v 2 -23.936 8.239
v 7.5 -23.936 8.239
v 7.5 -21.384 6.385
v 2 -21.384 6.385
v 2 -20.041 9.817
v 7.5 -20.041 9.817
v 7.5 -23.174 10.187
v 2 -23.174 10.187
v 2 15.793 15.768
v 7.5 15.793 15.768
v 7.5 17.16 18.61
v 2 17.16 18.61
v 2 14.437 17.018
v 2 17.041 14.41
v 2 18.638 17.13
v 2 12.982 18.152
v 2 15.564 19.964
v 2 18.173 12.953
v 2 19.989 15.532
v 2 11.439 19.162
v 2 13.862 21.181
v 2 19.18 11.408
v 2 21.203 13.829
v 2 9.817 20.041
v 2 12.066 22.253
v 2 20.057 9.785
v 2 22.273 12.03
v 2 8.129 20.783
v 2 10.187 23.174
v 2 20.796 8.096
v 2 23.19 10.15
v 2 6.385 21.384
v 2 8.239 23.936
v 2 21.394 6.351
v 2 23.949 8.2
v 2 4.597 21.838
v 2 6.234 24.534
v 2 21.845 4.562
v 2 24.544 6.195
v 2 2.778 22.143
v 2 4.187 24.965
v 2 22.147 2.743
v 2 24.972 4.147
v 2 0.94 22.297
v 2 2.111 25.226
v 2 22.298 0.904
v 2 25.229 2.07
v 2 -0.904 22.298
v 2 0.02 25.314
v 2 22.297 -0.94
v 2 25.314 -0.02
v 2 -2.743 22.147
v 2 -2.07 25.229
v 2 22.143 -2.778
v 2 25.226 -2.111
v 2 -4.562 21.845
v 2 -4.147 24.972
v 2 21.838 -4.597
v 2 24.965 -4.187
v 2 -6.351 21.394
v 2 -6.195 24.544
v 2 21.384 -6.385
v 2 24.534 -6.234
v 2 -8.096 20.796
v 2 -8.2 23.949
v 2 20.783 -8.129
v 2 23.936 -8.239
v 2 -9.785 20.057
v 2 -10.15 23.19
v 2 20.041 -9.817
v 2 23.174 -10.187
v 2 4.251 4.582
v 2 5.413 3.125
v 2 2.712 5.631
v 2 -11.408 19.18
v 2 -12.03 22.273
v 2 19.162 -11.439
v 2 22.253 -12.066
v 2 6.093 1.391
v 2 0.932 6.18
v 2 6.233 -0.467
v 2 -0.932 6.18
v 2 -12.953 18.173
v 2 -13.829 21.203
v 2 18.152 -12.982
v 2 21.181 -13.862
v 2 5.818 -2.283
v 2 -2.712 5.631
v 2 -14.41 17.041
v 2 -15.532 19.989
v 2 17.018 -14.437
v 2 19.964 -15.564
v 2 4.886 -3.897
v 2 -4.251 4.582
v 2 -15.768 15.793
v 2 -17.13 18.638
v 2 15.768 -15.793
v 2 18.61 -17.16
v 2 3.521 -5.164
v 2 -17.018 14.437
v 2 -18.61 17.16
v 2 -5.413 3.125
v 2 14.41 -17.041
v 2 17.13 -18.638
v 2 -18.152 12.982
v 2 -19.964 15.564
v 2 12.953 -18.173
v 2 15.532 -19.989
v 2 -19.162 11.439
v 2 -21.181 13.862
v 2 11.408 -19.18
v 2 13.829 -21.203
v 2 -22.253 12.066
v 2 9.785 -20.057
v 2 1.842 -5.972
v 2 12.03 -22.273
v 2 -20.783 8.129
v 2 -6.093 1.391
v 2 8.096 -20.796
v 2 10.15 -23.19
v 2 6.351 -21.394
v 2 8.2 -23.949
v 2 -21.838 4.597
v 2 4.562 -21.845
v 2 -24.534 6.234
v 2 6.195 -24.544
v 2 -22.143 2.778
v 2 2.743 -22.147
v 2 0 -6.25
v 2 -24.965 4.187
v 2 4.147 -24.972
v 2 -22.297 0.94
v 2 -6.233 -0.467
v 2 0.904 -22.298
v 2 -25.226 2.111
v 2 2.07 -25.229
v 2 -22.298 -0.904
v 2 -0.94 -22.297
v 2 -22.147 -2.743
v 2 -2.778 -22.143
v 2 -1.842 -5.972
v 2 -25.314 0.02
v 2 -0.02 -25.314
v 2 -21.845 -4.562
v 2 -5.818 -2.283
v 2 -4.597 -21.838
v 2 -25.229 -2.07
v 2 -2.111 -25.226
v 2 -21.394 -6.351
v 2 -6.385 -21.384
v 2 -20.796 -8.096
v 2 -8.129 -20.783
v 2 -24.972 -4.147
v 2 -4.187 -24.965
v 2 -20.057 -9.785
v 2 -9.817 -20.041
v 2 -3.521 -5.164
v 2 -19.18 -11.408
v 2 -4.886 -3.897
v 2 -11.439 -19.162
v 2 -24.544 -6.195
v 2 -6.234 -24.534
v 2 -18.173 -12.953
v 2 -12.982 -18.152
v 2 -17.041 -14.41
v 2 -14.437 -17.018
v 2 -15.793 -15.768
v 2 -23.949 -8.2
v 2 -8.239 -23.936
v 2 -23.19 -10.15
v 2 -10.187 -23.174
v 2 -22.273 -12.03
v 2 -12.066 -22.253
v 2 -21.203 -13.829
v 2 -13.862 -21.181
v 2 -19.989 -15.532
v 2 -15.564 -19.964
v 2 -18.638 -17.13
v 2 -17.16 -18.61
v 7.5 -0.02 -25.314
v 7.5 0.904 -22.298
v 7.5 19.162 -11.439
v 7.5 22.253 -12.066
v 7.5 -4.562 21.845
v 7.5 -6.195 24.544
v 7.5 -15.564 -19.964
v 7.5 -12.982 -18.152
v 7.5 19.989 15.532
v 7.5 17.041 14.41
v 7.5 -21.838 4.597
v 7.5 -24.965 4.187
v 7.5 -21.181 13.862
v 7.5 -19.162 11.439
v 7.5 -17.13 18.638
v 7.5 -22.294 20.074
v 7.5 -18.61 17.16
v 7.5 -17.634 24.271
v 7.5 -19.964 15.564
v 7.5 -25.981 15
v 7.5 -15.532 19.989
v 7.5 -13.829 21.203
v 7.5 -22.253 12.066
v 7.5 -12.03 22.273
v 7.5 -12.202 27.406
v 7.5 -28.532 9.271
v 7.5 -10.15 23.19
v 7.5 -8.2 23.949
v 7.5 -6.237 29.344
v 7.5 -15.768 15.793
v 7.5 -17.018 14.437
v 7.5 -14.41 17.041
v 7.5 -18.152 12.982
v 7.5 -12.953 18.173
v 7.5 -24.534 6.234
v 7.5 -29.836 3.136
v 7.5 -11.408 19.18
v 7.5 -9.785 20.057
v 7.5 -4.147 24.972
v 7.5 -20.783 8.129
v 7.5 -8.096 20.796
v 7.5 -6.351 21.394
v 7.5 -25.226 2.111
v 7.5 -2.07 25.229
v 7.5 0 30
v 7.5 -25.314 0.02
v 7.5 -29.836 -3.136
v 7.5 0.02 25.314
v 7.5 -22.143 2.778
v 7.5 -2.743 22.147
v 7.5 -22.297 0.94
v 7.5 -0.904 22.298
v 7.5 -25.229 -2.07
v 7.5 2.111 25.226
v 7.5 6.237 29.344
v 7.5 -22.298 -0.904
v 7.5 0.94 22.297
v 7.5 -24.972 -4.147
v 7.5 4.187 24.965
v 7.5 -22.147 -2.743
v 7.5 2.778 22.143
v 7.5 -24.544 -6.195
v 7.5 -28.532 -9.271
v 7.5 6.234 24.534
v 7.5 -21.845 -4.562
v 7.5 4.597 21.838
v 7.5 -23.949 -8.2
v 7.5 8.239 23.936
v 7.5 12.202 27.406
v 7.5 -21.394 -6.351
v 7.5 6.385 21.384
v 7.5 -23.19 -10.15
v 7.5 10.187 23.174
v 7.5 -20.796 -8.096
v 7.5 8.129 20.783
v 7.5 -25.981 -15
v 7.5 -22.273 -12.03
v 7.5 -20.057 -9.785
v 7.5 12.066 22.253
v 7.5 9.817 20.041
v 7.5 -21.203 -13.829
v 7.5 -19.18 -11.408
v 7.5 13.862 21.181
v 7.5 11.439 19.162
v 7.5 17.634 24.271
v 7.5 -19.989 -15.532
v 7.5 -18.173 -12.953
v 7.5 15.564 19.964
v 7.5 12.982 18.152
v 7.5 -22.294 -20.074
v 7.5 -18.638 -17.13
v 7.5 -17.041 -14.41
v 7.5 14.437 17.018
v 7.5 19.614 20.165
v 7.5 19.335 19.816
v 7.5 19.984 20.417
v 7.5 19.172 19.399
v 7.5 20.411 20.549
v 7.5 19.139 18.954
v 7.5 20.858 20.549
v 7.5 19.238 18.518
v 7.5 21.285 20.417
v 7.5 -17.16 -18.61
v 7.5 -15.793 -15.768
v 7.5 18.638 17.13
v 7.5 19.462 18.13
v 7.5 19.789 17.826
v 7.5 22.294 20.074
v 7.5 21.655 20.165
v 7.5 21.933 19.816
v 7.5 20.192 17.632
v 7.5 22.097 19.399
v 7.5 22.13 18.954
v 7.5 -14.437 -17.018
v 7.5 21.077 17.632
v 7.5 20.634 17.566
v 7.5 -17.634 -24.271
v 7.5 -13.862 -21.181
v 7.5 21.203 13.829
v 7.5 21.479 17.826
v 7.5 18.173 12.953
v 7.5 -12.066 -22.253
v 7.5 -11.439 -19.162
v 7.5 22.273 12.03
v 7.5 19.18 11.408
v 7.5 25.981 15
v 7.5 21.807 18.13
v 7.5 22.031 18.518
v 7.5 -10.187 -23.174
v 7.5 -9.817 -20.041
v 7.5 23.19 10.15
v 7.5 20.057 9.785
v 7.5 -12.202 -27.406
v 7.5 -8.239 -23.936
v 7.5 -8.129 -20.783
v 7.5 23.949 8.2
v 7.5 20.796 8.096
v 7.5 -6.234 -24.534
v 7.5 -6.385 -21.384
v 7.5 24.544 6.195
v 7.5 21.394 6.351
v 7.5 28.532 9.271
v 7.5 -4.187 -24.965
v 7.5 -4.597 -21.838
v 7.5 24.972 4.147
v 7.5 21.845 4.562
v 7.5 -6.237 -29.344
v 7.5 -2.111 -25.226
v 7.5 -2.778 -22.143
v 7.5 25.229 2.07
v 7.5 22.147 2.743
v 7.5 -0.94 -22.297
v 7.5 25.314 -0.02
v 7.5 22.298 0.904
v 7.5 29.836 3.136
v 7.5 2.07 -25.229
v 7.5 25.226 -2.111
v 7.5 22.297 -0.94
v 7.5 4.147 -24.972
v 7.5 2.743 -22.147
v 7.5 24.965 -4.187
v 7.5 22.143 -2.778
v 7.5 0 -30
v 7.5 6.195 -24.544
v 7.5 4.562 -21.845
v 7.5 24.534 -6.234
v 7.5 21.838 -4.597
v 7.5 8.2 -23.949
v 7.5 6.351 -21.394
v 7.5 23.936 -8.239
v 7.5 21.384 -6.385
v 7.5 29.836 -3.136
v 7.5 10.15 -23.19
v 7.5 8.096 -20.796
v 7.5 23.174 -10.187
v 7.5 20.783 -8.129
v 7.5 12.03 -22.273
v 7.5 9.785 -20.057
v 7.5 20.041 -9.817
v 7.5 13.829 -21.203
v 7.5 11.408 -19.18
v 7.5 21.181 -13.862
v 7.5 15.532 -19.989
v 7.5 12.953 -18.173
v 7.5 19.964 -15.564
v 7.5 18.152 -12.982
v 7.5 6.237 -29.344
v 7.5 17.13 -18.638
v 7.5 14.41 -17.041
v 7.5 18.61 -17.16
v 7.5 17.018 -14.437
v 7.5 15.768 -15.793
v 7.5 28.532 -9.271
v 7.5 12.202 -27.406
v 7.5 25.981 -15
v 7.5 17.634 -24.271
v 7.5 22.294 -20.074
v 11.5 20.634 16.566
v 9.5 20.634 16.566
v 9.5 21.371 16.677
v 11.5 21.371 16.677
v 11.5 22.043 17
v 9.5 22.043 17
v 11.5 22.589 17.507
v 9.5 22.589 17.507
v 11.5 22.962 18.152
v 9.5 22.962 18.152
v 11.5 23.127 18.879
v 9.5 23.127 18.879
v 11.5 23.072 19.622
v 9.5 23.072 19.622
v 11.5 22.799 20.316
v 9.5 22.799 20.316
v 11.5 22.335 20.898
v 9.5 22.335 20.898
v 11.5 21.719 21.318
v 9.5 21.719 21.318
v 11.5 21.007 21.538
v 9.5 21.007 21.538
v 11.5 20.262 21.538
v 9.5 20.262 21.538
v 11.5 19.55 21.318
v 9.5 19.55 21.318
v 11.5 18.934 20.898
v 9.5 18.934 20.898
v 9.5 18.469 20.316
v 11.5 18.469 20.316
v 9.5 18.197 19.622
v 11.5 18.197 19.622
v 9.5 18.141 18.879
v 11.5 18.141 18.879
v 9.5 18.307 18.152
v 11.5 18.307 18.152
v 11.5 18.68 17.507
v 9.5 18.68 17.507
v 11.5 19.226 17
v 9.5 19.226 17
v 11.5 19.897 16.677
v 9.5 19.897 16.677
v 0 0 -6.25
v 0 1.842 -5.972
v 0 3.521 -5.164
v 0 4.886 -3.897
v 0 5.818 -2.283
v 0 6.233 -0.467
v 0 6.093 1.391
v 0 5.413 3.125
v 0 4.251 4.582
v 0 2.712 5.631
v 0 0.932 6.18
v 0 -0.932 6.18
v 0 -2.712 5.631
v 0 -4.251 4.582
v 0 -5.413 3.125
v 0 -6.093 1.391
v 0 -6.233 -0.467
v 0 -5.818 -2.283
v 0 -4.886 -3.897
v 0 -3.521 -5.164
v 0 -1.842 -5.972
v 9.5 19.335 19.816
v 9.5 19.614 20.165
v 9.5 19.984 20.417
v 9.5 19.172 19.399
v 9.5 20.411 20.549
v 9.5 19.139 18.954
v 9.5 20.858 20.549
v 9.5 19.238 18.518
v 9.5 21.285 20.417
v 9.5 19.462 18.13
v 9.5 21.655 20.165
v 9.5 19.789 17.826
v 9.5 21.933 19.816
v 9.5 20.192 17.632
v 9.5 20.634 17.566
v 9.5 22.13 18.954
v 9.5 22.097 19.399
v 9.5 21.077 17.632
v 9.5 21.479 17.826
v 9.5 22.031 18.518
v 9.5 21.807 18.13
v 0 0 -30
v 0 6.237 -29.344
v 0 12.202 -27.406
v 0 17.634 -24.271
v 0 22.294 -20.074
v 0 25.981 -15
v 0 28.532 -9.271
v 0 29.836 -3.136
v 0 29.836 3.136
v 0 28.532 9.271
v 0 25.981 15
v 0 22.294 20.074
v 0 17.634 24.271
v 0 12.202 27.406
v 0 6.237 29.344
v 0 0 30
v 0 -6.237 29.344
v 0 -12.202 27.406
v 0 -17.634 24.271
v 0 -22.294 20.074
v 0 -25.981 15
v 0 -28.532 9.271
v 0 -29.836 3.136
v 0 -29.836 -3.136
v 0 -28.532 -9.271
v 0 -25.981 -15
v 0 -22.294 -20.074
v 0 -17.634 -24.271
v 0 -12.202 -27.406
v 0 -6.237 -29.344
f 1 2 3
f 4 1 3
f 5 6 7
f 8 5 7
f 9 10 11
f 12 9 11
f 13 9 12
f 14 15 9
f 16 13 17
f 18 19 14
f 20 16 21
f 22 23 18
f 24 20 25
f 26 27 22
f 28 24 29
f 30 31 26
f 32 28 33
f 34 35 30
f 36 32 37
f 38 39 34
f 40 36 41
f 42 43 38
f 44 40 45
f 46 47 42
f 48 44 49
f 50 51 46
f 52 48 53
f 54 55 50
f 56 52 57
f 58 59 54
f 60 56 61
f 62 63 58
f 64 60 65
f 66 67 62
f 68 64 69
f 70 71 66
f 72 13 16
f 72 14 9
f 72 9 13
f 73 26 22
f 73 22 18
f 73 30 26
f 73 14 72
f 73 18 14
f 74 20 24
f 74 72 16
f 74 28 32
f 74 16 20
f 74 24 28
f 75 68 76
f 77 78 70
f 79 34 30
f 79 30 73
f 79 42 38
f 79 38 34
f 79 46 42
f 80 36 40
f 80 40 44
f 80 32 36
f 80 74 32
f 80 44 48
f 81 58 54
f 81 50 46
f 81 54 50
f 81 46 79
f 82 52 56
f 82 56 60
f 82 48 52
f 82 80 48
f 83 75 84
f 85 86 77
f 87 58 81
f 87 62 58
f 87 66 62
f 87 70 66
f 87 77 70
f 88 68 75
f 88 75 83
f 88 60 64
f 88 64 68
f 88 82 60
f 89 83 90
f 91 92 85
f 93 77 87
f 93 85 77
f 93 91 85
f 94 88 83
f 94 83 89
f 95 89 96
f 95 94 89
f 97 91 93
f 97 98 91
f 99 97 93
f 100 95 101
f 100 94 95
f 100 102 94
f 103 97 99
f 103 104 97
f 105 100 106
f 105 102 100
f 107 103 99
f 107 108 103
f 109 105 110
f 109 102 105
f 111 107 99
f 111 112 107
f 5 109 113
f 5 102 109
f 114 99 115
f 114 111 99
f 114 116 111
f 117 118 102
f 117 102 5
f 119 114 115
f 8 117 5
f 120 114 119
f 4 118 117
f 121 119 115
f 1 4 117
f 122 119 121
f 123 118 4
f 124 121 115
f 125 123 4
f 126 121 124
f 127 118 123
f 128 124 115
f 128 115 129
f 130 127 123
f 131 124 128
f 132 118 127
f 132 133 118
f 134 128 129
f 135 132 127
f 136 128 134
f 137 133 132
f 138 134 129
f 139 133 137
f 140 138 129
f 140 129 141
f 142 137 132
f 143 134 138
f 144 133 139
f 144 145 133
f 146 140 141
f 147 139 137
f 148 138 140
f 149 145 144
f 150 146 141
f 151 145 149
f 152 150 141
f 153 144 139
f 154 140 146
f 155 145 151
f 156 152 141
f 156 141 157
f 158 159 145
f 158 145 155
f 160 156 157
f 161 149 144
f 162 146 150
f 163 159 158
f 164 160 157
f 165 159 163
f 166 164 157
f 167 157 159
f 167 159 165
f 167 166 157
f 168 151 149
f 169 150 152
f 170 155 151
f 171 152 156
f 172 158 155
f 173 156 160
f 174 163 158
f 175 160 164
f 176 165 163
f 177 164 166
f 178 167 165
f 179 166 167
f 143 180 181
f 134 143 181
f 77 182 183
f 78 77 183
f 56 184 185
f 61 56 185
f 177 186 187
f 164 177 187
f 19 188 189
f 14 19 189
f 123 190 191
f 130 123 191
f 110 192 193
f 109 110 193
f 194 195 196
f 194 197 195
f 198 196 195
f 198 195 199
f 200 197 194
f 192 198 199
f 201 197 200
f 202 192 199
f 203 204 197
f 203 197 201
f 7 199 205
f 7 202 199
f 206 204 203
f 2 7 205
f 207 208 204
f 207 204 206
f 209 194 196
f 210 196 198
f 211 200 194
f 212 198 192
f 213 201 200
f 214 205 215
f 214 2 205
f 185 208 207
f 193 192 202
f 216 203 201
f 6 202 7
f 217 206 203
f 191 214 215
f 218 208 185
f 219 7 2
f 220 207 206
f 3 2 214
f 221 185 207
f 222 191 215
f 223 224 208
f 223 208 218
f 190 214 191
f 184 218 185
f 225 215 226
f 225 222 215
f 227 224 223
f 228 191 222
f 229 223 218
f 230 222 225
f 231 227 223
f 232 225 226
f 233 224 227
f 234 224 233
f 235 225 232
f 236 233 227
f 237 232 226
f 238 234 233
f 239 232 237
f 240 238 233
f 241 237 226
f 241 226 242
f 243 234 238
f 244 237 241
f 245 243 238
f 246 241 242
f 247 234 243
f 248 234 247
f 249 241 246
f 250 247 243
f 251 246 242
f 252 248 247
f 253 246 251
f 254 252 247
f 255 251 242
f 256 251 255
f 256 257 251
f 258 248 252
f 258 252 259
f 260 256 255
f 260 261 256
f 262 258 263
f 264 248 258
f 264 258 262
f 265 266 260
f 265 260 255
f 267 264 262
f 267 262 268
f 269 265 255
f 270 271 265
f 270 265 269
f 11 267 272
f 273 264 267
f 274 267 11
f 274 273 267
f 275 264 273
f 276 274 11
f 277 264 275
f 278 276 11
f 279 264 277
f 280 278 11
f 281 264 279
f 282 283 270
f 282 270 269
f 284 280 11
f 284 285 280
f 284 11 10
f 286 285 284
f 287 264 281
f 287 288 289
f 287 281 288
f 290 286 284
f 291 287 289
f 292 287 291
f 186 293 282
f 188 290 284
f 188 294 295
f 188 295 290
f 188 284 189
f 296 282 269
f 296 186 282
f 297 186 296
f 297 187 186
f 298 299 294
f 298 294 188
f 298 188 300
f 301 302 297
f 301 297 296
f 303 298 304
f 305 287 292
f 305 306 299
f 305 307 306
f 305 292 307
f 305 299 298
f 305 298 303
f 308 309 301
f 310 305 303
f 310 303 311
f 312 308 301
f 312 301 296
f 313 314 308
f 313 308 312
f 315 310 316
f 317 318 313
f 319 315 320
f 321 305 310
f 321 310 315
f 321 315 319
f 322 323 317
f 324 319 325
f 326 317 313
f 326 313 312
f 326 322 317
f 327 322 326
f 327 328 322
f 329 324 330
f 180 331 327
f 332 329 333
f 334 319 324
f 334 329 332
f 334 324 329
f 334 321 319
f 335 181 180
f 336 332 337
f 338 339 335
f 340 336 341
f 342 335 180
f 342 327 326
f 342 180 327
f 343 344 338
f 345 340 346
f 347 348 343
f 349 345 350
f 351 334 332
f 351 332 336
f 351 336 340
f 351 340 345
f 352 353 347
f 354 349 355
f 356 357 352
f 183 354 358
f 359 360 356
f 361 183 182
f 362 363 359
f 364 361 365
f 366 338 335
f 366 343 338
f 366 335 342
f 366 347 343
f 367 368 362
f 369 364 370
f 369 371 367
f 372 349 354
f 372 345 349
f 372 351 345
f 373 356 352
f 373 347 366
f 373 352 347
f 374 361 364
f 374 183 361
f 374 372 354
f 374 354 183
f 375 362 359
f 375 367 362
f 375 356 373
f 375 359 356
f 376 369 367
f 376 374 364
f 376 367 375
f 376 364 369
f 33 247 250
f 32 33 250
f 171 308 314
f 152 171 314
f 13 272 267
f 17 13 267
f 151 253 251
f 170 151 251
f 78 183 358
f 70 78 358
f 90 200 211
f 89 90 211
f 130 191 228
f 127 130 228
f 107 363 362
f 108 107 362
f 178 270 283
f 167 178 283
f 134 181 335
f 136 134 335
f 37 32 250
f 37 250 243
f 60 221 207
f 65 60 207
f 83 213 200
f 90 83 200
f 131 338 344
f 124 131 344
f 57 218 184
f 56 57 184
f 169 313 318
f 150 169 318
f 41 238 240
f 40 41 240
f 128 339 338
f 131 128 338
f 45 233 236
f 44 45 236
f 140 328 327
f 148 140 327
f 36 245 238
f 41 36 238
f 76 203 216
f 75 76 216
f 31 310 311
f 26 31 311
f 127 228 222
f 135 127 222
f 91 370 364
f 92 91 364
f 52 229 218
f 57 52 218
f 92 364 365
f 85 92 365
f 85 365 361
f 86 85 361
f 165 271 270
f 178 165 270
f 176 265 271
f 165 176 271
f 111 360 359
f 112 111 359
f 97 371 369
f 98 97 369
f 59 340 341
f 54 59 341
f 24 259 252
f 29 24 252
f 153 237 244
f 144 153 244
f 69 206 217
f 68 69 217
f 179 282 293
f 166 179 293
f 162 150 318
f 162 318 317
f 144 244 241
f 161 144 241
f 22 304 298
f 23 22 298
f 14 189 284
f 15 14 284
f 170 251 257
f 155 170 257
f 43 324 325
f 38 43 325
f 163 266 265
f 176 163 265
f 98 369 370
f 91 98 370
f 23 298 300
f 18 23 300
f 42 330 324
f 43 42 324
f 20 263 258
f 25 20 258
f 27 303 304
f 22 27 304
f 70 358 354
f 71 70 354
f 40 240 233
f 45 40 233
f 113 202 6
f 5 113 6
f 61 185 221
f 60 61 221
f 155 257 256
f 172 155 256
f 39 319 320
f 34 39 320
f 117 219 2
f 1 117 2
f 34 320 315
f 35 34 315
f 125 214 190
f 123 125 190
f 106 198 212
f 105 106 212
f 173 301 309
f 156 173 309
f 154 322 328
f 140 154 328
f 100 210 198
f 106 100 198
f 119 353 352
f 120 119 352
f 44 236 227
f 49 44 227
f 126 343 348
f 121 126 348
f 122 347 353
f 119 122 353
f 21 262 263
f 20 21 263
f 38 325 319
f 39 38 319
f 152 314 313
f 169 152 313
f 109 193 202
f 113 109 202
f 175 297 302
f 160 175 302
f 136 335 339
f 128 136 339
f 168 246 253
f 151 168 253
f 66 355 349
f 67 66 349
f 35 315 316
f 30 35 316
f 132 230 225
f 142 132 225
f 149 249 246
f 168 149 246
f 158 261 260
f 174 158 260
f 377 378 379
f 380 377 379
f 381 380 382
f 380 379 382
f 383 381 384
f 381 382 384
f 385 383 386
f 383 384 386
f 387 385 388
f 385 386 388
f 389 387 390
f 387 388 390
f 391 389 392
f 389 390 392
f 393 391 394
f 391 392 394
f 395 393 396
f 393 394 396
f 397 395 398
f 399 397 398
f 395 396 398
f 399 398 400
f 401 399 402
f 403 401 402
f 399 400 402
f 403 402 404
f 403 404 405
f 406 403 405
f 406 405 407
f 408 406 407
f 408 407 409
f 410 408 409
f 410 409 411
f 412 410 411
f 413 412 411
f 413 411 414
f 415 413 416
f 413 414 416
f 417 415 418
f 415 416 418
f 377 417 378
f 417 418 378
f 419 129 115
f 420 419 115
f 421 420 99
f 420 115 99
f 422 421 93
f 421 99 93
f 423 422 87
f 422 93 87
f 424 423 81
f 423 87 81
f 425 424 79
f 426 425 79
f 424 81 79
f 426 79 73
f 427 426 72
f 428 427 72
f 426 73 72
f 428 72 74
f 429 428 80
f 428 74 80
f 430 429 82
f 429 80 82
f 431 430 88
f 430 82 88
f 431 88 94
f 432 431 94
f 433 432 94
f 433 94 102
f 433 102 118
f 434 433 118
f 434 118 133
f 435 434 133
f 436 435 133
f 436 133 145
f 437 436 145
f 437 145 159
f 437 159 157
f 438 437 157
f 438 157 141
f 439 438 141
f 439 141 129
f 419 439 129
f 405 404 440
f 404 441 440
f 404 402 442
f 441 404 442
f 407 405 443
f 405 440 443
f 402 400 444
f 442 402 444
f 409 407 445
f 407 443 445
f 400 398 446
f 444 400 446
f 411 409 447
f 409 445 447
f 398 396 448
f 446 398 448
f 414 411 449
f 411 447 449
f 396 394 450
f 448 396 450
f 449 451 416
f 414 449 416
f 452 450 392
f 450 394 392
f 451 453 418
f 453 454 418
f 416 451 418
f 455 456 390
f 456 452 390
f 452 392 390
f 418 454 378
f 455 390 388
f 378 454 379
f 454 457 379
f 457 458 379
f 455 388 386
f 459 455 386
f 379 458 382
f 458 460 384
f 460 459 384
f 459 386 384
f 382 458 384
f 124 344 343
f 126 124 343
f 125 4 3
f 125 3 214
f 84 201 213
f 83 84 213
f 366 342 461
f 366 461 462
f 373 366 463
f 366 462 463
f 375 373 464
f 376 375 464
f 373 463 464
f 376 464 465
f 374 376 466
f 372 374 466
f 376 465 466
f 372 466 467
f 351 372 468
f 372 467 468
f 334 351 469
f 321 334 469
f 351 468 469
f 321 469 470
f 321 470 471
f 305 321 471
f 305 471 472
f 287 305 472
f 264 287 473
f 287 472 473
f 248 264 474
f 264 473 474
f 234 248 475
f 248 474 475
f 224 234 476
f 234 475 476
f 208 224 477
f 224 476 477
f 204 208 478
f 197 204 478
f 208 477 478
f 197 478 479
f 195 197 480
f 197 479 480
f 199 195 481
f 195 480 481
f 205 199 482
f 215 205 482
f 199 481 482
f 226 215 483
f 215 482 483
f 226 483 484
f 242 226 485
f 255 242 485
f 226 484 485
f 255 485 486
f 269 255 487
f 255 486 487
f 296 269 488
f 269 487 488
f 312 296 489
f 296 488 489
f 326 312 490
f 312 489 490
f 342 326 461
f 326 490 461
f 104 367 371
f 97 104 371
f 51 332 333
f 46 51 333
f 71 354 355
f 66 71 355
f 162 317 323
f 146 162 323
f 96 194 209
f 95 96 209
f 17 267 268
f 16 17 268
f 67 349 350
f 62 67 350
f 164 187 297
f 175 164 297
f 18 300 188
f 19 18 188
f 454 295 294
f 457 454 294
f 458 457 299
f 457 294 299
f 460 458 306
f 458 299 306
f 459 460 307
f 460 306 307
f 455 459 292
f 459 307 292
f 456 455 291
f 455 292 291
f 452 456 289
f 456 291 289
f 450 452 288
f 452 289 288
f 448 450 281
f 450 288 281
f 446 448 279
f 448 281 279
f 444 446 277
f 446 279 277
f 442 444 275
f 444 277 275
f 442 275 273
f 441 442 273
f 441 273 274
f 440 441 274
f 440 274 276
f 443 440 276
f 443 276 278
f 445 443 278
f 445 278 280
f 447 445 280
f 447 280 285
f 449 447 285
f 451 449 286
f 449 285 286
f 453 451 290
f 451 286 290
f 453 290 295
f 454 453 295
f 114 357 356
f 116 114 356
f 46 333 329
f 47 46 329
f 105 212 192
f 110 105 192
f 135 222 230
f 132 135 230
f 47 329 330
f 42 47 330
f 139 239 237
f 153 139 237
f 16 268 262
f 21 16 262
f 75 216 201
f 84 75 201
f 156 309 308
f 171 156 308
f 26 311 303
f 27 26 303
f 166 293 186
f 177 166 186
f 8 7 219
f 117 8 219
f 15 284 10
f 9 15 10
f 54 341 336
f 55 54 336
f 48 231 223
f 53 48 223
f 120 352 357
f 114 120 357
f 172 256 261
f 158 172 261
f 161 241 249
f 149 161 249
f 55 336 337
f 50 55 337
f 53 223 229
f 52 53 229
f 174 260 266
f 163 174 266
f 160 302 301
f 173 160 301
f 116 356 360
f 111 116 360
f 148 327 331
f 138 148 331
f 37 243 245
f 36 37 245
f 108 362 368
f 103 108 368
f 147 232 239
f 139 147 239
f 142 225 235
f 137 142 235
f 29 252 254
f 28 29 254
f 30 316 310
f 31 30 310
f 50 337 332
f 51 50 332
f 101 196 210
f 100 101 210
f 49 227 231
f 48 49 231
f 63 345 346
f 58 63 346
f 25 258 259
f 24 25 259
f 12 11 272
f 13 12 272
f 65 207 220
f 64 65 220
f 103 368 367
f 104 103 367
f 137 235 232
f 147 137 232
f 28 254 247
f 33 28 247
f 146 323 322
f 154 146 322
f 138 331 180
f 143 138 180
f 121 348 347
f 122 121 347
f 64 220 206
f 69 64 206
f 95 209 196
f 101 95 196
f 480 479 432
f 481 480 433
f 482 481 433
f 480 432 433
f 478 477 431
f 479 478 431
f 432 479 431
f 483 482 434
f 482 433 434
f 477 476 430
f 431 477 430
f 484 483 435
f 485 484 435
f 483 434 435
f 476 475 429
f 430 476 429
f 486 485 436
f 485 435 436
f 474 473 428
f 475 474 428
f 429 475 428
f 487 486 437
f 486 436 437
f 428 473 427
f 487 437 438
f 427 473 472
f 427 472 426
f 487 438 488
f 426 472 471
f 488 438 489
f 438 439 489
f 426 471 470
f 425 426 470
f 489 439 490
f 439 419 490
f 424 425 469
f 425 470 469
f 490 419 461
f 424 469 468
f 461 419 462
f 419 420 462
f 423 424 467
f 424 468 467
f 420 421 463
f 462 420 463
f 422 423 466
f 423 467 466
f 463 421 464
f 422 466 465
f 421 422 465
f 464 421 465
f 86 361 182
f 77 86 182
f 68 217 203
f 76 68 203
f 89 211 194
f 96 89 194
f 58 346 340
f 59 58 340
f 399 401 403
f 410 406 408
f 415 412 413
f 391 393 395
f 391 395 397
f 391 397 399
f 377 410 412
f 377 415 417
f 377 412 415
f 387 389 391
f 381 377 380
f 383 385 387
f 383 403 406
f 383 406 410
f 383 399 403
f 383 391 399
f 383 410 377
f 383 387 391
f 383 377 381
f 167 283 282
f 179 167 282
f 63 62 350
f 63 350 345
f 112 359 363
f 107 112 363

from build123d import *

# Parameters (mm, degrees)
SKETCH1_R           = 30
BOSS_EXTRUDE1_DEPTH = 7.5
CUT_EXTRUDE2_DEPTH  = 5.5
SKETCH6_R           = 6.25
CUT_EXTRUDE3_DEPTH  = 3
SKETCH9_R           = 1.5
BOSS_EXTRUDE5_DEPTH = 2
SKETCH10_R          = 2.5
BOSS_EXTRUDE6_DEPTH = 2


with BuildPart() as part:
    # Sketch1 → Boss-Extrude1 (new body)
    with BuildSketch(Plane(origin=(0, 0, 0), x_dir=(0, 0, -1), z_dir=(1, 0, 0))):
        Circle(SKETCH1_R)
    extrude(amount=BOSS_EXTRUDE1_DEPTH)

    # Sketch4 → Cut-Extrude2 (cut)
    with BuildSketch(Plane(origin=(7.5, 0, 0), x_dir=(0, -1, 0), z_dir=(1, 0, 0))):
        Polygon((8.200315972, -23.949003355), (8.095646912, -20.796423541), (10.150000757, -23.190028641), (9.785351218, -20.056859988), (12.030350745, -22.272642516), (11.408211652, -19.180287743), (13.828521239, -21.20311166), (12.953142433, -18.172694685), (15.532228911, -19.988742051), (14.409590118, -17.040963696), (17.12983571, -18.637829065), (15.76760569, -15.792825644), (18.610428362, -17.159600809), (17.017912527, -14.43680658), (19.963892917, -15.564155079), (18.151969766, -12.982169489), (21.18098384, -13.862390389), (19.162030646, -11.438851016), (22.253387167, -12.065931515), (20.041195426, -9.817393592), (23.173777294, -10.187050095), (20.78345852, -8.128873414), (23.935867025, -8.238580793), (21.383749518, -6.384824789), (24.534450513, -6.233833631), (21.837967824, -4.597161336), (24.965438827, -4.186503063), (22.143010666, -2.77809461), (25.225887879, -2.110574435), (22.296794293, -0.940050681), (25.314018538, -0.020228443), (22.298268206, 0.904414747), (25.229228782, 2.070255729), (22.147422337, 2.742702106), (24.972097812, 4.146597956), (21.845287117, 4.562254028), (24.544382092, 6.194614714), (21.393926434, 6.350641129), (23.949003355, 8.200315972), (20.796423541, 8.095646912), (23.190028641, 10.150000757), (20.056859988, 9.785351218), (22.272642516, 12.030350745), (19.180287743, 11.408211652), (21.20311166, 13.828521239), (18.172694685, 12.953142433), (19.988742051, 15.532228911), (17.040963696, 14.409590118), (18.637829065, 17.12983571), (15.792825644, 15.76760569), (17.159600809, 18.610428362), (14.43680658, 17.017912527), (15.564155079, 19.963892917), (12.982169489, 18.151969766), (13.862390389, 21.18098384), (11.438851016, 19.162030646), (12.065931515, 22.253387167), (9.817393592, 20.041195426), (10.187050095, 23.173777294), (8.128873414, 20.78345852), (8.238580793, 23.935867025), (6.384824789, 21.383749518), (6.233833631, 24.534450513), (4.597161336, 21.837967824), (4.186503063, 24.965438827), (2.77809461, 22.143010666), (2.110574435, 25.225887879), (0.940050681, 22.296794293), (0.020228443, 25.314018538), (-0.904414747, 22.298268206), (-2.070255729, 25.229228782), (-2.742702106, 22.147422337), (-4.146597956, 24.972097812), (-4.562254028, 21.845287117), (-6.194614714, 24.544382092), (-6.350641129, 21.393926434), (-8.200315972, 23.949003355), (-8.095646912, 20.796423541), (-10.150000757, 23.190028641), (-9.785351218, 20.056859988), (-12.030350745, 22.272642516), (-11.408211652, 19.180287743), (-13.828521239, 21.20311166), (-12.953142433, 18.172694685), (-15.532228911, 19.988742051), (-14.409590118, 17.040963696), (-17.12983571, 18.637829065), (-15.76760569, 15.792825644), (-18.610428362, 17.159600809), (-17.017912527, 14.43680658), (-19.963892917, 15.564155079), (-18.151969766, 12.982169489), (-21.18098384, 13.862390389), (-19.162030646, 11.438851016), (-22.253387167, 12.065931515), (-20.041195426, 9.817393592), (-23.173777294, 10.187050095), (-20.78345852, 8.128873414), (-23.935867025, 8.238580793), (-21.383749518, 6.384824789), (-24.534450513, 6.233833631), (-21.837967824, 4.597161336), (-24.965438827, 4.186503063), (-22.143010666, 2.77809461), (-25.225887879, 2.110574435), (-22.296794293, 0.940050681), (-25.314018538, 0.020228443), (-22.298268206, -0.904414747), (-25.229228782, -2.070255729), (-22.147422337, -2.742702106), (-24.972097812, -4.146597956), (-21.845287117, -4.562254028), (-24.544382092, -6.194614714), (-21.393926434, -6.350641129), (-23.949003355, -8.200315972), (-20.796423541, -8.095646912), (-23.190028641, -10.150000757), (-20.056859988, -9.785351218), (-22.272642516, -12.030350745), (-19.180287743, -11.408211652), (-21.20311166, -13.828521239), (-18.172694685, -12.953142433), (-19.988742051, -15.532228911), (-17.040963696, -14.409590118), (-18.637829065, -17.12983571), (-15.792825644, -15.76760569), (-17.159600809, -18.610428362), (-14.43680658, -17.017912527), (-15.564155079, -19.963892917), (-12.982169489, -18.151969766), (-13.862390389, -21.18098384), (-11.438851016, -19.162030646), (-12.065931515, -22.253387167), (-9.817393592, -20.041195426), (-10.187050095, -23.173777294), (-8.128873414, -20.78345852), (-8.238580793, -23.935867025), (-6.384824789, -21.383749518), (-6.233833631, -24.534450513), (-4.597161336, -21.837967824), (-4.186503063, -24.965438827), (-2.77809461, -22.143010666), (-2.110574435, -25.225887879), (-0.940050681, -22.296794293), (-0.020228443, -25.314018538), (0.904414747, -22.298268206), (2.070255729, -25.229228782), (2.742702106, -22.147422337), (4.146597956, -24.972097812), (4.562254028, -21.845287117), (6.194614714, -24.544382092), (6.350641129, -21.393926434), align=None)
    extrude(amount=-CUT_EXTRUDE2_DEPTH, mode=Mode.SUBTRACT)

    # Sketch6 → Cut-Extrude3 (cut, through all)
    with BuildSketch(Plane(origin=(2, 0, 0), x_dir=(0, 0, -1), z_dir=(1, 0, 0))):
        Circle(SKETCH6_R)
    extrude(amount=-CUT_EXTRUDE3_DEPTH, mode=Mode.SUBTRACT)

    # Sketch9 → Boss-Extrude5 (add)
    with BuildSketch(Plane(origin=(7.5, 0, 0), x_dir=(0, 0, -1), z_dir=(1, 0, 0))):
        with Locations((-19.065690414, 20.634386461)):
            Circle(SKETCH9_R)
    extrude(amount=BOSS_EXTRUDE5_DEPTH)

    # Sketch10 → Boss-Extrude6 (add)
    with BuildSketch(Plane(origin=(9.5, 0, 0), x_dir=(0, 0, -1), z_dir=(1, 0, 0))):
        with Locations((-19.065690414, 20.634386461)):
            Circle(SKETCH10_R)
    extrude(amount=BOSS_EXTRUDE6_DEPTH)


solid = part.part
